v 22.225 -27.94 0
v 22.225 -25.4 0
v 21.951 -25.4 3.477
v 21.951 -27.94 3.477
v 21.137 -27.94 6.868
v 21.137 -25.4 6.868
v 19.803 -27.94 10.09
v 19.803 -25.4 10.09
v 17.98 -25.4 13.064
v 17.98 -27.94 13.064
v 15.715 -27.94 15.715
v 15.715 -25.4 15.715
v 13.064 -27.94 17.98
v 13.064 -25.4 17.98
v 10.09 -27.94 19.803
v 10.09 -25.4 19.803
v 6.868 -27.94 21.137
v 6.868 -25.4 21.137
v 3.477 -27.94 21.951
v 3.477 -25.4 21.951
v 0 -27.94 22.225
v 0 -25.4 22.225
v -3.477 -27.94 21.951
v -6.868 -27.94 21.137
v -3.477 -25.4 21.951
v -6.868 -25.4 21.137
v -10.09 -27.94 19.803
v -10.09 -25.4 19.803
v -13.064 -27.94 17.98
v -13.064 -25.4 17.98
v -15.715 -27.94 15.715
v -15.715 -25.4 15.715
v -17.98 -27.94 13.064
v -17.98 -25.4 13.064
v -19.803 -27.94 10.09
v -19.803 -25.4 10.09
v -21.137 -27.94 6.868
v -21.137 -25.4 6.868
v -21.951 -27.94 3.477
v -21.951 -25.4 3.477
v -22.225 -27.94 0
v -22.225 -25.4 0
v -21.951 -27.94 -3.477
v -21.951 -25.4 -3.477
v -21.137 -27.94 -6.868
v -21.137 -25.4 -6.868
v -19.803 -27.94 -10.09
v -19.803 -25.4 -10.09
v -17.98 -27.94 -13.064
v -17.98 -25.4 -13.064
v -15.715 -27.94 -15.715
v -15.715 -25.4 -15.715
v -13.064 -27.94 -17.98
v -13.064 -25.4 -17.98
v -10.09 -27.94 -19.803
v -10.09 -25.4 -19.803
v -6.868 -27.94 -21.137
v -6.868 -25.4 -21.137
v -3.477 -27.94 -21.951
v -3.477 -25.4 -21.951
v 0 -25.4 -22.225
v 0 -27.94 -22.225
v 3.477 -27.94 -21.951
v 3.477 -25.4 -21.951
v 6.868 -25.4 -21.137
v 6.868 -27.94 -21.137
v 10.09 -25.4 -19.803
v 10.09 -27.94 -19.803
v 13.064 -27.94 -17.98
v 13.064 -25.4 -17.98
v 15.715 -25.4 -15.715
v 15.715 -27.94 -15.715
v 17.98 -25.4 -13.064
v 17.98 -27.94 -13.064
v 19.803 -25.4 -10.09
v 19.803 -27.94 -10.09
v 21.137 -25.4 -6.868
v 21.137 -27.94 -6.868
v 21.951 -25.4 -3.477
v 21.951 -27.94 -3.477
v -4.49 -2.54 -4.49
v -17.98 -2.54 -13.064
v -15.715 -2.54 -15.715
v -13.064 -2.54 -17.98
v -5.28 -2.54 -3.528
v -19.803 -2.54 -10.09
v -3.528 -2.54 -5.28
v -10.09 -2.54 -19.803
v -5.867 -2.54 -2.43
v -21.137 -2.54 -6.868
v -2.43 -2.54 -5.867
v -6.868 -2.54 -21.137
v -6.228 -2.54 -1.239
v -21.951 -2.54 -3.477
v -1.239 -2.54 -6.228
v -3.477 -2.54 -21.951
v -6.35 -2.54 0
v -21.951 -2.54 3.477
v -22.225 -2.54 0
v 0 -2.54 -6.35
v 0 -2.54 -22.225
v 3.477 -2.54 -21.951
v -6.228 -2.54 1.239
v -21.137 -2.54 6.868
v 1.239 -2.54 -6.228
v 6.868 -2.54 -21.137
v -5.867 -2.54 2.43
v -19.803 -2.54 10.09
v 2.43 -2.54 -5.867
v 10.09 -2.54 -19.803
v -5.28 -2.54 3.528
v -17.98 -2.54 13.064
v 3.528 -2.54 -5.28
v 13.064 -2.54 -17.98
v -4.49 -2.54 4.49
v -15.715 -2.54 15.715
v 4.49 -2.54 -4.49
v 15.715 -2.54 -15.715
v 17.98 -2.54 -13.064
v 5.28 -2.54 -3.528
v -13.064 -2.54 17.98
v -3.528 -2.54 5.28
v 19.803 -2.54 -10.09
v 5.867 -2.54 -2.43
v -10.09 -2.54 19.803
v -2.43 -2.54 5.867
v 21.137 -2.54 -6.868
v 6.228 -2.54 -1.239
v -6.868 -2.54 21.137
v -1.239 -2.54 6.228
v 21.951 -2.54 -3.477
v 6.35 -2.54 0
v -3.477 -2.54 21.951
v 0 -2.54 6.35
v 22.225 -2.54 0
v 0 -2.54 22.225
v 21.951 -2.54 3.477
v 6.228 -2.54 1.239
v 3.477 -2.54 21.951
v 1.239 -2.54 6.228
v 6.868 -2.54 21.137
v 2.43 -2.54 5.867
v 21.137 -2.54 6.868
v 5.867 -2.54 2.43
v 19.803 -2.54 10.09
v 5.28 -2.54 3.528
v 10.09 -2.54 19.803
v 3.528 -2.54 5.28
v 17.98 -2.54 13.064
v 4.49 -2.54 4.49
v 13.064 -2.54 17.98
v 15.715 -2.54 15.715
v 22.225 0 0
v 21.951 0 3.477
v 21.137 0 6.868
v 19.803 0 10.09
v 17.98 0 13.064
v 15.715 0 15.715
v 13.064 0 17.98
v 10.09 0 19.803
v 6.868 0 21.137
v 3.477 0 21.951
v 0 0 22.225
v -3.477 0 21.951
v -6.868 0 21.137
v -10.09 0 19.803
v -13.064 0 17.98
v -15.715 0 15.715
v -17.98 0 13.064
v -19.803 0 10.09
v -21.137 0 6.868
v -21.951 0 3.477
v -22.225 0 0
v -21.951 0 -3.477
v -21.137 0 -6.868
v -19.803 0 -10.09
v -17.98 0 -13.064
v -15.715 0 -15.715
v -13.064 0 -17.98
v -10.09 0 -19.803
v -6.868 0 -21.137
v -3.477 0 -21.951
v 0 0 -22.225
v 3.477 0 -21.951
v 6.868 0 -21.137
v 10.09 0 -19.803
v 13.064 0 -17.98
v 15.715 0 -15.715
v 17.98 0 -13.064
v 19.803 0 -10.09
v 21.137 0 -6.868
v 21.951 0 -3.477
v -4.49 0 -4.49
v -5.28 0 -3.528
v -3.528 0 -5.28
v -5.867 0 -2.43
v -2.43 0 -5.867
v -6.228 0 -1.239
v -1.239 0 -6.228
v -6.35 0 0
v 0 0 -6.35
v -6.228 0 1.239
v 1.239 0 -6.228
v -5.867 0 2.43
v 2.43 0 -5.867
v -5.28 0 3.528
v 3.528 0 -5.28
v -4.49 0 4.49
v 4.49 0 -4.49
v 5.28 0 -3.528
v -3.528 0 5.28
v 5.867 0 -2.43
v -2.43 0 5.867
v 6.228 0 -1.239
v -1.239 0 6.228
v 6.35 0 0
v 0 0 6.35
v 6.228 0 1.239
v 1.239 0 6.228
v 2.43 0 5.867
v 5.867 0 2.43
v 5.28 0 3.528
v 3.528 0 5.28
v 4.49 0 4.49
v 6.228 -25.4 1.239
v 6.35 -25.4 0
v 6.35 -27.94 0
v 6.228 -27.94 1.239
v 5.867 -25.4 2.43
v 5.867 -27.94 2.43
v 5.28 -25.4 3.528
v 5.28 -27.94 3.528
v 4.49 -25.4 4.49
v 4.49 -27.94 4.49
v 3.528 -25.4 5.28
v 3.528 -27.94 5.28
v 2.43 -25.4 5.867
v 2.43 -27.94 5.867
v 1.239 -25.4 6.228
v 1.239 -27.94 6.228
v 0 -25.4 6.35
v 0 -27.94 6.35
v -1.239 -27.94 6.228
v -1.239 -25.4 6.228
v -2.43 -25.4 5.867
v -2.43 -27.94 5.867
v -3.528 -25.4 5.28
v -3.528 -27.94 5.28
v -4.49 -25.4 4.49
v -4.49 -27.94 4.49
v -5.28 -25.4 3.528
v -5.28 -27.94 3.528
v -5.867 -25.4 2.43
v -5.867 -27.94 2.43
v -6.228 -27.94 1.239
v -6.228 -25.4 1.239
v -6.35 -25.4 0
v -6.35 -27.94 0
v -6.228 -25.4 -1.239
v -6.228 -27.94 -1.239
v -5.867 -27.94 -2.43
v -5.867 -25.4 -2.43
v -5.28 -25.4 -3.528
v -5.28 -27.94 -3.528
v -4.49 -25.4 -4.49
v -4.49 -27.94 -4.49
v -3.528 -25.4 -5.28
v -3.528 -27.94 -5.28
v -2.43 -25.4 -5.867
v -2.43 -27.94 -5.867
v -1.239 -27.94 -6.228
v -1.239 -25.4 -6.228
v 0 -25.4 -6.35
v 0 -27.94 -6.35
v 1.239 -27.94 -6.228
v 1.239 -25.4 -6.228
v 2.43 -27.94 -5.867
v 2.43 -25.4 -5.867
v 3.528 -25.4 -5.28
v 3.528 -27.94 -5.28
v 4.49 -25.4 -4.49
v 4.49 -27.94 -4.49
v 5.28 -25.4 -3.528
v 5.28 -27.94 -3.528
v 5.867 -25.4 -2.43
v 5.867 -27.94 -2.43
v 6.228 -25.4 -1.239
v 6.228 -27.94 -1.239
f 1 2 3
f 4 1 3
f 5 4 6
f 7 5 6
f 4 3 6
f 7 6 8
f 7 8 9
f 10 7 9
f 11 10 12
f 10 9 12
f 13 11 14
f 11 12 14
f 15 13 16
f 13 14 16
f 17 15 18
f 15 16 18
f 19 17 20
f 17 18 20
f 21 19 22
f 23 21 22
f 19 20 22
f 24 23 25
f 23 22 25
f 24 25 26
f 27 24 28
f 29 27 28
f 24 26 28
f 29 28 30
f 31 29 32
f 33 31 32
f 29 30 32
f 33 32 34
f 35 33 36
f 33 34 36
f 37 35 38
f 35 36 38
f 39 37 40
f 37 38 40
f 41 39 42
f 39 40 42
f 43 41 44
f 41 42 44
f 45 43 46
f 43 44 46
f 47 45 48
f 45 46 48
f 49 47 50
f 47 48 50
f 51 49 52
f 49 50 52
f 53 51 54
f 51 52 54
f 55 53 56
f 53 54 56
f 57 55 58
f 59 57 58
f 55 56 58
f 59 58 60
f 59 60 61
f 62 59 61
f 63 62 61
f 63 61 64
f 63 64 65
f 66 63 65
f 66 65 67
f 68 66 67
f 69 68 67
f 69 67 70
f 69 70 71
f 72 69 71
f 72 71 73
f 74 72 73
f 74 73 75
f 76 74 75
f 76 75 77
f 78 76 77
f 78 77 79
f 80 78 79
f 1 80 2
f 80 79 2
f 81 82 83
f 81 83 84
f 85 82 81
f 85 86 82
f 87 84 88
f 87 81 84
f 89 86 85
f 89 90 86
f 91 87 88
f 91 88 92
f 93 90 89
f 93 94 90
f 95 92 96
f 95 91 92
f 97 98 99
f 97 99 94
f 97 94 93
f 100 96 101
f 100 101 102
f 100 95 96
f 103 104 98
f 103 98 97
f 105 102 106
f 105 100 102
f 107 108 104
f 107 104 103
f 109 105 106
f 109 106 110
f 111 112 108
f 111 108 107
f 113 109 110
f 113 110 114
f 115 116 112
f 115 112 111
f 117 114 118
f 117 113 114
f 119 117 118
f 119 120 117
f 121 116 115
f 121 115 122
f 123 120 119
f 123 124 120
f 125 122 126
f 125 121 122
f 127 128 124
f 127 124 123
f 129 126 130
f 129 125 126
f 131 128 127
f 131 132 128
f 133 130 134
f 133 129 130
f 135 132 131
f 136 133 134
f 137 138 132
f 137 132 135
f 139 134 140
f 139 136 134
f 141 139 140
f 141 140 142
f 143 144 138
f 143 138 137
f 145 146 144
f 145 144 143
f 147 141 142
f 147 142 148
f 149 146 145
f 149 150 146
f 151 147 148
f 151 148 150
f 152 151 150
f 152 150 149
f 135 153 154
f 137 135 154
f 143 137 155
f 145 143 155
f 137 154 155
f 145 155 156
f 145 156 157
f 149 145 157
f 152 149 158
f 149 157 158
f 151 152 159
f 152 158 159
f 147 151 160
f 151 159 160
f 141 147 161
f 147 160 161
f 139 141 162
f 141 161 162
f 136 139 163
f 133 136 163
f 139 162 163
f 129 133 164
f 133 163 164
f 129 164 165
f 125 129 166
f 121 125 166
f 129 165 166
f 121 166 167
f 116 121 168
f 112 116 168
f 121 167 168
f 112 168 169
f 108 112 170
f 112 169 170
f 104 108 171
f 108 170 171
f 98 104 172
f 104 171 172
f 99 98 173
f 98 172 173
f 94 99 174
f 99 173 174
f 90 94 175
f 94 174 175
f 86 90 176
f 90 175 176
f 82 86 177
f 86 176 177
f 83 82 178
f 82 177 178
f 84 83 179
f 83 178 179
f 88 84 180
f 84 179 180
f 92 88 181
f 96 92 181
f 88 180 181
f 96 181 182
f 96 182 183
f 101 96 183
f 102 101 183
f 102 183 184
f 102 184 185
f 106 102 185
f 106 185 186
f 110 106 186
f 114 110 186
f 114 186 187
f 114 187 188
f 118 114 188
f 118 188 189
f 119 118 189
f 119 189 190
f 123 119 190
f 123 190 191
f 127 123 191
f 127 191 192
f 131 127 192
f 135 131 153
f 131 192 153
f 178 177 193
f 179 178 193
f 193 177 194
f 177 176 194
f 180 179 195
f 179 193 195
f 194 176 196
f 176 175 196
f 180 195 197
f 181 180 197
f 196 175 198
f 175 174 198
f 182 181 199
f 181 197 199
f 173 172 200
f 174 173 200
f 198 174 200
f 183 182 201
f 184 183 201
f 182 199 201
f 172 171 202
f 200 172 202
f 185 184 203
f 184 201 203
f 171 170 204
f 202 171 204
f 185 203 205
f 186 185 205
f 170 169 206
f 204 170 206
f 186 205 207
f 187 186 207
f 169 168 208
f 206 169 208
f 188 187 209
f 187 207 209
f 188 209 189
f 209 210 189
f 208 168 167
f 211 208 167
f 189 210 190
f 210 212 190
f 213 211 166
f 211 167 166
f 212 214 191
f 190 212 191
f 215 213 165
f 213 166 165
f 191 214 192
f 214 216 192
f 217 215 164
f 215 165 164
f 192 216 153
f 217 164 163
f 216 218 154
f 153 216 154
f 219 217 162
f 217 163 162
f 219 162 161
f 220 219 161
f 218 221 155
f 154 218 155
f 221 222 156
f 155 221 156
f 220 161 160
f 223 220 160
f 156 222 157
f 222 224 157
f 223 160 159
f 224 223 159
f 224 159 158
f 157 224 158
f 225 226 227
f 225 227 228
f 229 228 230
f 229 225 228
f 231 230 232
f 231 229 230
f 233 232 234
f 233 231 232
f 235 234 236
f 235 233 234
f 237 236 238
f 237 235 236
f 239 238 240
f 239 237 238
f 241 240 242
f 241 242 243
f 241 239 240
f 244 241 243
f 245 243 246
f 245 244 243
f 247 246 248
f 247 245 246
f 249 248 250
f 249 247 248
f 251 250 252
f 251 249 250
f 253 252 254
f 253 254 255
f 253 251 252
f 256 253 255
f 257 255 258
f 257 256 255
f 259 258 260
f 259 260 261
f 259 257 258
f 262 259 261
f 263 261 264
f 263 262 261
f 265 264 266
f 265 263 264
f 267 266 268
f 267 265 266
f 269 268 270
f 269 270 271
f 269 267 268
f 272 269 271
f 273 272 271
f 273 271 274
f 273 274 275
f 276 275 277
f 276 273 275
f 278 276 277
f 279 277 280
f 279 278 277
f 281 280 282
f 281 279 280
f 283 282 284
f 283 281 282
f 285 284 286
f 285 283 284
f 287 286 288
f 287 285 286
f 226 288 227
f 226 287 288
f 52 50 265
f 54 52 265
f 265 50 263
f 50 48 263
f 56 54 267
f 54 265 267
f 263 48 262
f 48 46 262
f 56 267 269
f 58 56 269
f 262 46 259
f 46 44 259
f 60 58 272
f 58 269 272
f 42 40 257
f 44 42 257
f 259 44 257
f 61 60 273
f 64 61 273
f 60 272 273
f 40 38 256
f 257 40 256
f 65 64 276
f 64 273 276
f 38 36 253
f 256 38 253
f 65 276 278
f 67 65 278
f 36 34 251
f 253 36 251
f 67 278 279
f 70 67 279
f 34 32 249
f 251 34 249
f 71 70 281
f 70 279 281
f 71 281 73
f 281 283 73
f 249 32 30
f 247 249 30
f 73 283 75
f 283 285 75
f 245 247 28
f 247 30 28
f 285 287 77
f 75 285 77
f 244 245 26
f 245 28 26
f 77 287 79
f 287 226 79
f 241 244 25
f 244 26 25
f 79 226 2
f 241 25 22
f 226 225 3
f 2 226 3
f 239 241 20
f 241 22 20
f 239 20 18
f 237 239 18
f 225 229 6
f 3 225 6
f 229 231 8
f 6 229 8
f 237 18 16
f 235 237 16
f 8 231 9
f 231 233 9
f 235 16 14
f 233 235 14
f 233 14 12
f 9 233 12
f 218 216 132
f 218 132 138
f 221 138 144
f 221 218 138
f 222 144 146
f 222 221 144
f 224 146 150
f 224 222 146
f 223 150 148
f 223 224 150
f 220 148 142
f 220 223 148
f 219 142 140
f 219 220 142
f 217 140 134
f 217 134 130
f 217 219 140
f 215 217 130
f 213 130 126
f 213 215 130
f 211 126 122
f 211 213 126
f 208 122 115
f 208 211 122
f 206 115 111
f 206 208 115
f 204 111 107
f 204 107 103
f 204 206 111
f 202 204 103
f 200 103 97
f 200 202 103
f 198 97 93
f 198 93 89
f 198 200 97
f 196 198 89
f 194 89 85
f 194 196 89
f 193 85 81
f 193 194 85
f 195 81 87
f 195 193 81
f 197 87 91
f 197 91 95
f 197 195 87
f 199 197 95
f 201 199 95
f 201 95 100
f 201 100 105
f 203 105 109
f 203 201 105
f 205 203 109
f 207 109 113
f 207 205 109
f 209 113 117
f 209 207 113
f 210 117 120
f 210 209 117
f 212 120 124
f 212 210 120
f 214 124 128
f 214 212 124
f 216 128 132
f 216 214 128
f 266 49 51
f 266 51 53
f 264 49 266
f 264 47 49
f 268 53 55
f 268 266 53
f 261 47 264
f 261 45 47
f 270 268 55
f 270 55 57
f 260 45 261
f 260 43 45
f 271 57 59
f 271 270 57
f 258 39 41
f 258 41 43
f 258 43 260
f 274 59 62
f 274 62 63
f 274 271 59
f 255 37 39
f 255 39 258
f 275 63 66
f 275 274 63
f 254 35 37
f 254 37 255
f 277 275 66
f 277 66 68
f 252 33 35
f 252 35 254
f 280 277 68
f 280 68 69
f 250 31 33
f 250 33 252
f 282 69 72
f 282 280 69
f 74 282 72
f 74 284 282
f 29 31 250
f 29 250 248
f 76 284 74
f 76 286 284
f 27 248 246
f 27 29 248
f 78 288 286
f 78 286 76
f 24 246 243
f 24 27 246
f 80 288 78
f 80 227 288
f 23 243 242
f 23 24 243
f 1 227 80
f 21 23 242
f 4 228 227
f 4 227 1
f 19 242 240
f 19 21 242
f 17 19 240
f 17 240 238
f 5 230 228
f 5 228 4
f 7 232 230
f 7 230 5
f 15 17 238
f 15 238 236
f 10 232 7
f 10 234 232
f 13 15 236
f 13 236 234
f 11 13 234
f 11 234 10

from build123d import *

# Parameters (mm, degrees)
F0_R     = 22.225
F0_R_2   = 6.35
F1_DEPTH = 2.54
F3_R     = 22.225
F3_R_2   = 6.35
F4_DEPTH = 2.54


with BuildPart() as f1:
    # F0 (on Front) → F1 (new body)
    with BuildSketch(Plane.XZ):
        Circle(F0_R)
        Circle(F0_R_2, mode=Mode.SUBTRACT)
    extrude(amount=F1_DEPTH)


with BuildPart() as f4:
    # F3 (on offset) → F4 (new body)
    with BuildSketch(Plane.XZ.offset(25.4)):
        Circle(F3_R)
        Circle(F3_R_2, mode=Mode.SUBTRACT)
    extrude(amount=F4_DEPTH)


solid = Compound([f1.part, f4.part])
